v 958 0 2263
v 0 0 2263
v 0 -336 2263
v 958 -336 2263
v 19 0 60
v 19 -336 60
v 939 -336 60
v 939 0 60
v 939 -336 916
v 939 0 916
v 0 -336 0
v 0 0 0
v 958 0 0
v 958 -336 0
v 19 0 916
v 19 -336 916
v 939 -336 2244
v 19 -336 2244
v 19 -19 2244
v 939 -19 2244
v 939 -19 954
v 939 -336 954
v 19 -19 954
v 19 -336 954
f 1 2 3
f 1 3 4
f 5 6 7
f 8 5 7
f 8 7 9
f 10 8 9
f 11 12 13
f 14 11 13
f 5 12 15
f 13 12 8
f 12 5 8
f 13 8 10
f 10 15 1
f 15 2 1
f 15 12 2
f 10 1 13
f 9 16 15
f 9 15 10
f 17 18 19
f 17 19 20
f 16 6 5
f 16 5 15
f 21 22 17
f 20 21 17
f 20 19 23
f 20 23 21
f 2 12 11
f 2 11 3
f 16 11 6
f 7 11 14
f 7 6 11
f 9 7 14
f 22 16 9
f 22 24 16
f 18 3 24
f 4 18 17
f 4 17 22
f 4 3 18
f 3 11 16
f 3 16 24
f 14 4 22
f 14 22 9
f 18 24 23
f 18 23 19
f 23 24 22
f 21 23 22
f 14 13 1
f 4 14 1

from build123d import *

# Parameters (mm, degrees)
F0_W      = 958
F0_H      = 2263
F1_DEPTH  = 336
F2_W      = 920
F2_H      = 856
F2_H_2    = 1290
F3_DEPTH  = 317
F3_FACE_W = 920
F3_FACE_H = 856
F4_DEPTH  = 25


with BuildPart() as f1:
    # F0 (on Front) → F1 (new body)
    with BuildSketch(Plane.XZ):
        with Locations((479, 1131.5)):
            Rectangle(F0_W, F0_H)
    extrude(amount=F1_DEPTH)

    # F2 (on face) → F3 (cut)
    with BuildSketch(Plane.XZ.offset(336)):
        with Locations((479, 488)):
            Rectangle(F2_W, F2_H)
        with Locations((479, 1599)):
            Rectangle(F2_W, F2_H_2)
    extrude(amount=-F3_DEPTH, mode=Mode.SUBTRACT)

    # F3_face (on face) → F4 (cut)
    with BuildSketch(Plane(origin=(479, -19, 488), x_dir=(1, 0, 0), z_dir=(0, -1, 0))):
        Rectangle(F3_FACE_W, F3_FACE_H)
    extrude(amount=-F4_DEPTH, mode=Mode.SUBTRACT)


solid = f1.part
